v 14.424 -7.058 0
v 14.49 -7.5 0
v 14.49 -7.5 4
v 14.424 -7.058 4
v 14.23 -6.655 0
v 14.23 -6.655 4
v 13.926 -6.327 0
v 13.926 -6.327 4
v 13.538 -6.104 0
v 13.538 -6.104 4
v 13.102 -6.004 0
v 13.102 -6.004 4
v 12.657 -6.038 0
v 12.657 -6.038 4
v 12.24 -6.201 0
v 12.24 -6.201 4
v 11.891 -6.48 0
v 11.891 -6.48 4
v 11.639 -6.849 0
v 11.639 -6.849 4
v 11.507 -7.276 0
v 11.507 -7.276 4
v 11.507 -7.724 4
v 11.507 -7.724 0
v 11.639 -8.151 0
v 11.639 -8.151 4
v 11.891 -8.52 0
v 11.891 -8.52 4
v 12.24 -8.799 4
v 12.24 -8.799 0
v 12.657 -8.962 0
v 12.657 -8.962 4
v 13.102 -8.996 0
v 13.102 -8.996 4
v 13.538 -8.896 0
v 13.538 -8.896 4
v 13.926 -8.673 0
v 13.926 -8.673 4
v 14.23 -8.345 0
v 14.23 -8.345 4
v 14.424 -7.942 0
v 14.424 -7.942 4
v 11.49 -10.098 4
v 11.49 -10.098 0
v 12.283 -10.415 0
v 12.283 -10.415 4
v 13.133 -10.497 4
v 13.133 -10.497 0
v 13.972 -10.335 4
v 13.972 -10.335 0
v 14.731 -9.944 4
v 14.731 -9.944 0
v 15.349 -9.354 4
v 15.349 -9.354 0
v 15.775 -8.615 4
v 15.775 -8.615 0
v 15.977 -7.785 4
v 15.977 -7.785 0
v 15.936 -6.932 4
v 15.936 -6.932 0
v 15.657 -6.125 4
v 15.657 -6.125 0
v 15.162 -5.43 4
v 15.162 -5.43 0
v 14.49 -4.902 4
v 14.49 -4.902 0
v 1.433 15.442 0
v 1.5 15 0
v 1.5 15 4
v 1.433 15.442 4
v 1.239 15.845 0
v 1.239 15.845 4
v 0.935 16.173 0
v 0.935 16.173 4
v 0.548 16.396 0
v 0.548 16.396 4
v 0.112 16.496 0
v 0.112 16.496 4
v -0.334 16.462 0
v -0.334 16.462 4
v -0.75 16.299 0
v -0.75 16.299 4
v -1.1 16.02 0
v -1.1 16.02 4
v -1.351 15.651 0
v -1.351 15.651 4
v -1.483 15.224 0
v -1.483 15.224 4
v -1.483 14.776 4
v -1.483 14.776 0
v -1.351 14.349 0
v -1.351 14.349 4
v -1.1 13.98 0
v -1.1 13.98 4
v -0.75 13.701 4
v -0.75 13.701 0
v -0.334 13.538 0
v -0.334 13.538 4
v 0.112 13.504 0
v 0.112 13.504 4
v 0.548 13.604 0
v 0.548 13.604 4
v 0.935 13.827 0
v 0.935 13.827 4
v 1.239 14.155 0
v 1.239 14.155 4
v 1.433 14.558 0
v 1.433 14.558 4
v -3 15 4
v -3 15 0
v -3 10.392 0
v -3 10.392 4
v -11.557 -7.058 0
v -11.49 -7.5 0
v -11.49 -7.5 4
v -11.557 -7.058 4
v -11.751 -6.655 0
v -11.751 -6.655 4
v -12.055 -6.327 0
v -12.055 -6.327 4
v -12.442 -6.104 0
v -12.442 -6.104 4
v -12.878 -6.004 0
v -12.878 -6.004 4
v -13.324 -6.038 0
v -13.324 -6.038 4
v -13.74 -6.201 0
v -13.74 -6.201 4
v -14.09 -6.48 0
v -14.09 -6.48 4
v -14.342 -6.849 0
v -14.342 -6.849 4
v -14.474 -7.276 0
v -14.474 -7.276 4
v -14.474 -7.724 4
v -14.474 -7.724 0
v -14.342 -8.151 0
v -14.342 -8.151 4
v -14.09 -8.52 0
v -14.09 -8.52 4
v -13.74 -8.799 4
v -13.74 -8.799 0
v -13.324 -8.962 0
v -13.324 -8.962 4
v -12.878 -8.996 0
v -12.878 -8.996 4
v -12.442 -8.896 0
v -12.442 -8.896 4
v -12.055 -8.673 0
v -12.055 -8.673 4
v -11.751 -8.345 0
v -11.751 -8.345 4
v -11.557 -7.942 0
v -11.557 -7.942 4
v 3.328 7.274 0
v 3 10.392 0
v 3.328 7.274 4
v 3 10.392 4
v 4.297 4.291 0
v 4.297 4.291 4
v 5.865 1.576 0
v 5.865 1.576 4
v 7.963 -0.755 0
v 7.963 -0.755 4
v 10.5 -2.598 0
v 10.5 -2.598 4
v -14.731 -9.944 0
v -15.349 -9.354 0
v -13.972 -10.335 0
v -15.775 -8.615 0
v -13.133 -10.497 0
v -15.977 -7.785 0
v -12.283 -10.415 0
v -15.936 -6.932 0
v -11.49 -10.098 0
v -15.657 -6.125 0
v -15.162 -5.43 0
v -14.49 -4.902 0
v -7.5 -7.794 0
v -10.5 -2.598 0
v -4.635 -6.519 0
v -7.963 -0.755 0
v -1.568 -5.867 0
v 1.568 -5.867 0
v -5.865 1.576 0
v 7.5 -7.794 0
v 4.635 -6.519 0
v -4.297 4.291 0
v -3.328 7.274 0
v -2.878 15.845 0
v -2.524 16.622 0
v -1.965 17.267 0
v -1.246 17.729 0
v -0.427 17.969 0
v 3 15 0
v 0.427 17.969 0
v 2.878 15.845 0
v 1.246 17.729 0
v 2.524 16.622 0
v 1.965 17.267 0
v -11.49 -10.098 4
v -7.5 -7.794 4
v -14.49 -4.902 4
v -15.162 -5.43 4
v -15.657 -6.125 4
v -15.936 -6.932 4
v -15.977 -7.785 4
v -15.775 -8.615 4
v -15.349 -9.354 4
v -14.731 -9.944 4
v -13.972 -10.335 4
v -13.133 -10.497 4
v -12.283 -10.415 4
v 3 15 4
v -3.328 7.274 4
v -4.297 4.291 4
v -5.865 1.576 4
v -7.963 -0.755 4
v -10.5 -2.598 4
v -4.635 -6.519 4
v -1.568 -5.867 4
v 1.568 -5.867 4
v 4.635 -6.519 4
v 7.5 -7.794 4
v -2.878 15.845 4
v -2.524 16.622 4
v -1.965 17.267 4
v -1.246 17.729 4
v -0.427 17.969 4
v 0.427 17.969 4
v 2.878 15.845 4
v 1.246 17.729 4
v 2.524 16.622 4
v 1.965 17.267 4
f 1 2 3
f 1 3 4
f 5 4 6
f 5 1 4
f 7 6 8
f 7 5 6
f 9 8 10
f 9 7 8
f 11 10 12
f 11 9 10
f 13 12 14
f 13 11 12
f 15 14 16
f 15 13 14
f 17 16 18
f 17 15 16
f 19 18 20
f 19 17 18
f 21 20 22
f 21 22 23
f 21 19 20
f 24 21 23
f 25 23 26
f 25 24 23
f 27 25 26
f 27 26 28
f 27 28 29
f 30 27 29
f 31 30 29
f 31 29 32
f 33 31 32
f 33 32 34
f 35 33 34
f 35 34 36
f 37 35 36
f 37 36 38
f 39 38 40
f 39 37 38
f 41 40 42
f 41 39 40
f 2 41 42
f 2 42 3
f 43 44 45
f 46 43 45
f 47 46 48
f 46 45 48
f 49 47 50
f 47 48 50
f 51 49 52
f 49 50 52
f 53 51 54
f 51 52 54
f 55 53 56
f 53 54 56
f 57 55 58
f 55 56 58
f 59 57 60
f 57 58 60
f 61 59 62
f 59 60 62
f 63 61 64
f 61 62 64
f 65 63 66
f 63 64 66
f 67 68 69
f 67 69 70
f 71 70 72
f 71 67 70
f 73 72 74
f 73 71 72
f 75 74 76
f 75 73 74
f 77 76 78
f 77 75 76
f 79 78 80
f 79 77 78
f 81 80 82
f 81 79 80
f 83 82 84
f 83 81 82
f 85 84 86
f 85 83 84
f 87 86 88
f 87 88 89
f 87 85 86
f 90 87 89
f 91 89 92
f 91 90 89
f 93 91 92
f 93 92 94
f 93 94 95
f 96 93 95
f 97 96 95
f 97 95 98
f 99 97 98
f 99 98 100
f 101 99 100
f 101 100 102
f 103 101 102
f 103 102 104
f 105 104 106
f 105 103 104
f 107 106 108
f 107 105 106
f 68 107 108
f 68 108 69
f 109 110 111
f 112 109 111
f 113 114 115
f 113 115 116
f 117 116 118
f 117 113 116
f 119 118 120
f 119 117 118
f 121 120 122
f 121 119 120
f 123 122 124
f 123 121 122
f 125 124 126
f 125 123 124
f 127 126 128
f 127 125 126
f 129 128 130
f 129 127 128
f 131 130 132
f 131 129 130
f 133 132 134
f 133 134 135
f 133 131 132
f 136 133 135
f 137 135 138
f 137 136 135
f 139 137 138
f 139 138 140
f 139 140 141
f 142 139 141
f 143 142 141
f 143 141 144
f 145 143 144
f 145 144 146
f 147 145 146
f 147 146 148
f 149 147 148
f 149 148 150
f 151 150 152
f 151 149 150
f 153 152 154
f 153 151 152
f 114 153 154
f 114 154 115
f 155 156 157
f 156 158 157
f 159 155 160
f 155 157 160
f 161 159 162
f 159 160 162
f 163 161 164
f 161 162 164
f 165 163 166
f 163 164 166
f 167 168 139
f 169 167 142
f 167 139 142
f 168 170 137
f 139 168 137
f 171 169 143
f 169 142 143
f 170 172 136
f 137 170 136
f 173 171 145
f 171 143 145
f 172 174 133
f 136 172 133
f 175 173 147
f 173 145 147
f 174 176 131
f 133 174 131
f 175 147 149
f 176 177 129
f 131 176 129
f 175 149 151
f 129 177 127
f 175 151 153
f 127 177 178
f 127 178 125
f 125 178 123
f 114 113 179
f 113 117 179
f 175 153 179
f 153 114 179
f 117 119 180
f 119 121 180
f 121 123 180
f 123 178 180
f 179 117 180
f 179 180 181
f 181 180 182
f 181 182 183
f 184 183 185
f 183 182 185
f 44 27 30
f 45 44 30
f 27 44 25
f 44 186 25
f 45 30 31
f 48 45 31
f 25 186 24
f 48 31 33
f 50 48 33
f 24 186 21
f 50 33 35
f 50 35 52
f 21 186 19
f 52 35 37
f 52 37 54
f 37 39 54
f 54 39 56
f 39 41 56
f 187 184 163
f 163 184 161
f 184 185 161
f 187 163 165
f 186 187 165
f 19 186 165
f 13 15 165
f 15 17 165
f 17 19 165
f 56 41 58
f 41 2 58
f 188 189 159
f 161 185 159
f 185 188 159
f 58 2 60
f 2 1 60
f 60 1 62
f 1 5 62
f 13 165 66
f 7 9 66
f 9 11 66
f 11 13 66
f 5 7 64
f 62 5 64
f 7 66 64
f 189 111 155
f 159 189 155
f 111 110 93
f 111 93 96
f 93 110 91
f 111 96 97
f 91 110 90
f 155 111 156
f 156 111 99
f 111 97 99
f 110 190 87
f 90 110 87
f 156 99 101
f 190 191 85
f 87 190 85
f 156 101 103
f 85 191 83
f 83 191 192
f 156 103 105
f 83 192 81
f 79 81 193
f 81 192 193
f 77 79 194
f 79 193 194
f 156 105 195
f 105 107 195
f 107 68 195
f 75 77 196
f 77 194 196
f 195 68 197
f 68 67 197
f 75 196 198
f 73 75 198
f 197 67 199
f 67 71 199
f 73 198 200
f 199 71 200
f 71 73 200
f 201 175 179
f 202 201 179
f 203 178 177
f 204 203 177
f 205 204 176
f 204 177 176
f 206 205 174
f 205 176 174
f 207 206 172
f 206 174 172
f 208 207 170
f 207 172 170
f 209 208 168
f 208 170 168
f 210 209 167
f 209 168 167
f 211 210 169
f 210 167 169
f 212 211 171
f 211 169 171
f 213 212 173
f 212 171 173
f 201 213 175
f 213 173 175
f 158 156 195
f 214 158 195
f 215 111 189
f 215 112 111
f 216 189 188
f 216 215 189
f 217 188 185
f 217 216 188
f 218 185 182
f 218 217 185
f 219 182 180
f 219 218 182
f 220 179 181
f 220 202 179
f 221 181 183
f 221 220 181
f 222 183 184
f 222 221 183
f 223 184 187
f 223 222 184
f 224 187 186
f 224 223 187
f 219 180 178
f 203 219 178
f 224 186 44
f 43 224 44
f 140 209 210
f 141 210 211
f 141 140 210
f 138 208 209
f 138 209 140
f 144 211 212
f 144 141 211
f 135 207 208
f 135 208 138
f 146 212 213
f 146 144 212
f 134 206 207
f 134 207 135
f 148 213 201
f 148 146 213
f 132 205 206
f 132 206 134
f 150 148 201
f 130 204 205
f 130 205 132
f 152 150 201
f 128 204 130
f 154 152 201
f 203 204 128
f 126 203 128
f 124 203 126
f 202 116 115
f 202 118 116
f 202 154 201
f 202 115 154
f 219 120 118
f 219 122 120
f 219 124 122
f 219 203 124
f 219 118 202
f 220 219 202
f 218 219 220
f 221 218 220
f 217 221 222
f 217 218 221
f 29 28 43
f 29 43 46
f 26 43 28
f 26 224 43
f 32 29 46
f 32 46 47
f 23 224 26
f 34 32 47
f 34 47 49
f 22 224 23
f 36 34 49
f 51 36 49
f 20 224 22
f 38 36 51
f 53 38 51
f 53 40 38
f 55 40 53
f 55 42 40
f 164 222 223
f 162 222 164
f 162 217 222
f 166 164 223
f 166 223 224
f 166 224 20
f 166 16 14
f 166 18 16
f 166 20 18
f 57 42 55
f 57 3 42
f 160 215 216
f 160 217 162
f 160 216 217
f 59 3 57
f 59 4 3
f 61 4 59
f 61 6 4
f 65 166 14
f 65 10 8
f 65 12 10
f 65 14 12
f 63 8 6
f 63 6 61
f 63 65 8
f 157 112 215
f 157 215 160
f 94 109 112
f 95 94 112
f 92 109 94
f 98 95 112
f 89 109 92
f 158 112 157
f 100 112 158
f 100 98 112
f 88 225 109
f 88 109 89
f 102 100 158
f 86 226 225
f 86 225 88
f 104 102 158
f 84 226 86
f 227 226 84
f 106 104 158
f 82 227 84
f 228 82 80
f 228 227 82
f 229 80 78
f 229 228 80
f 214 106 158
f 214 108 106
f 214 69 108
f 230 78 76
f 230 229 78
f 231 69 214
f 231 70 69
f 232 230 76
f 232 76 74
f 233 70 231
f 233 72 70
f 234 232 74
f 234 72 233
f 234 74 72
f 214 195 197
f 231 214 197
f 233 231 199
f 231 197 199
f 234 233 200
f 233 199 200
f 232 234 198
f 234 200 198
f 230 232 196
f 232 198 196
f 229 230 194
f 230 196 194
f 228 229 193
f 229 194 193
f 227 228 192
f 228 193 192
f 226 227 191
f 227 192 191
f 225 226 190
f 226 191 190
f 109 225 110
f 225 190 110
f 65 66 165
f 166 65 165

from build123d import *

# Parameters (mm, degrees)
SKETCH_1_R      = 1.5
EXTRUDE_1_DEPTH = 4
FILLET_1_R      = 15


with BuildPart() as part:
    # 草图1 → 凸台-拉伸1 (new body)
    with BuildSketch(Plane.XY):
        with BuildLine():
            Line((-3, 15), (-3, 1.732050808))
            Line((-3, 1.732050808), (-14.490381057, -4.901923789))
            ThreePointArc((-14.490381057, -4.901923789), (-15.588457268, -9), (-11.490381057, -10.098076211))
            Line((-11.490381057, -10.098076211), (0, -3.464101615))
            Line((0, -3.464101615), (11.490381057, -10.098076211))
            ThreePointArc((11.490381057, -10.098076211), (15.588457268, -9), (14.490381057, -4.901923789))
            Line((14.490381057, -4.901923789), (3, 1.732050808))
            Line((3, 1.732050808), (3, 15))
            ThreePointArc((3, 15), (0, 18), (-3, 15))
        make_face()
        with Locations((0, 15)):
            Circle(SKETCH_1_R, mode=Mode.SUBTRACT)
        with Locations((12.990381057, -7.5)):
            Circle(SKETCH_1_R, mode=Mode.SUBTRACT)
        with Locations((-12.990381057, -7.5)):
            Circle(SKETCH_1_R, mode=Mode.SUBTRACT)
    extrude(amount=EXTRUDE_1_DEPTH)

    # 圆角1
    fillet_1_edges = [part.edges().sort_by_distance(p)[0] for p in [
        (-3, 1.732050808, 2),
        (3, 1.732050808, 2),
        (0, -3.464101615, 2),
    ]]
    fillet(fillet_1_edges, radius=FILLET_1_R)


solid = part.part
